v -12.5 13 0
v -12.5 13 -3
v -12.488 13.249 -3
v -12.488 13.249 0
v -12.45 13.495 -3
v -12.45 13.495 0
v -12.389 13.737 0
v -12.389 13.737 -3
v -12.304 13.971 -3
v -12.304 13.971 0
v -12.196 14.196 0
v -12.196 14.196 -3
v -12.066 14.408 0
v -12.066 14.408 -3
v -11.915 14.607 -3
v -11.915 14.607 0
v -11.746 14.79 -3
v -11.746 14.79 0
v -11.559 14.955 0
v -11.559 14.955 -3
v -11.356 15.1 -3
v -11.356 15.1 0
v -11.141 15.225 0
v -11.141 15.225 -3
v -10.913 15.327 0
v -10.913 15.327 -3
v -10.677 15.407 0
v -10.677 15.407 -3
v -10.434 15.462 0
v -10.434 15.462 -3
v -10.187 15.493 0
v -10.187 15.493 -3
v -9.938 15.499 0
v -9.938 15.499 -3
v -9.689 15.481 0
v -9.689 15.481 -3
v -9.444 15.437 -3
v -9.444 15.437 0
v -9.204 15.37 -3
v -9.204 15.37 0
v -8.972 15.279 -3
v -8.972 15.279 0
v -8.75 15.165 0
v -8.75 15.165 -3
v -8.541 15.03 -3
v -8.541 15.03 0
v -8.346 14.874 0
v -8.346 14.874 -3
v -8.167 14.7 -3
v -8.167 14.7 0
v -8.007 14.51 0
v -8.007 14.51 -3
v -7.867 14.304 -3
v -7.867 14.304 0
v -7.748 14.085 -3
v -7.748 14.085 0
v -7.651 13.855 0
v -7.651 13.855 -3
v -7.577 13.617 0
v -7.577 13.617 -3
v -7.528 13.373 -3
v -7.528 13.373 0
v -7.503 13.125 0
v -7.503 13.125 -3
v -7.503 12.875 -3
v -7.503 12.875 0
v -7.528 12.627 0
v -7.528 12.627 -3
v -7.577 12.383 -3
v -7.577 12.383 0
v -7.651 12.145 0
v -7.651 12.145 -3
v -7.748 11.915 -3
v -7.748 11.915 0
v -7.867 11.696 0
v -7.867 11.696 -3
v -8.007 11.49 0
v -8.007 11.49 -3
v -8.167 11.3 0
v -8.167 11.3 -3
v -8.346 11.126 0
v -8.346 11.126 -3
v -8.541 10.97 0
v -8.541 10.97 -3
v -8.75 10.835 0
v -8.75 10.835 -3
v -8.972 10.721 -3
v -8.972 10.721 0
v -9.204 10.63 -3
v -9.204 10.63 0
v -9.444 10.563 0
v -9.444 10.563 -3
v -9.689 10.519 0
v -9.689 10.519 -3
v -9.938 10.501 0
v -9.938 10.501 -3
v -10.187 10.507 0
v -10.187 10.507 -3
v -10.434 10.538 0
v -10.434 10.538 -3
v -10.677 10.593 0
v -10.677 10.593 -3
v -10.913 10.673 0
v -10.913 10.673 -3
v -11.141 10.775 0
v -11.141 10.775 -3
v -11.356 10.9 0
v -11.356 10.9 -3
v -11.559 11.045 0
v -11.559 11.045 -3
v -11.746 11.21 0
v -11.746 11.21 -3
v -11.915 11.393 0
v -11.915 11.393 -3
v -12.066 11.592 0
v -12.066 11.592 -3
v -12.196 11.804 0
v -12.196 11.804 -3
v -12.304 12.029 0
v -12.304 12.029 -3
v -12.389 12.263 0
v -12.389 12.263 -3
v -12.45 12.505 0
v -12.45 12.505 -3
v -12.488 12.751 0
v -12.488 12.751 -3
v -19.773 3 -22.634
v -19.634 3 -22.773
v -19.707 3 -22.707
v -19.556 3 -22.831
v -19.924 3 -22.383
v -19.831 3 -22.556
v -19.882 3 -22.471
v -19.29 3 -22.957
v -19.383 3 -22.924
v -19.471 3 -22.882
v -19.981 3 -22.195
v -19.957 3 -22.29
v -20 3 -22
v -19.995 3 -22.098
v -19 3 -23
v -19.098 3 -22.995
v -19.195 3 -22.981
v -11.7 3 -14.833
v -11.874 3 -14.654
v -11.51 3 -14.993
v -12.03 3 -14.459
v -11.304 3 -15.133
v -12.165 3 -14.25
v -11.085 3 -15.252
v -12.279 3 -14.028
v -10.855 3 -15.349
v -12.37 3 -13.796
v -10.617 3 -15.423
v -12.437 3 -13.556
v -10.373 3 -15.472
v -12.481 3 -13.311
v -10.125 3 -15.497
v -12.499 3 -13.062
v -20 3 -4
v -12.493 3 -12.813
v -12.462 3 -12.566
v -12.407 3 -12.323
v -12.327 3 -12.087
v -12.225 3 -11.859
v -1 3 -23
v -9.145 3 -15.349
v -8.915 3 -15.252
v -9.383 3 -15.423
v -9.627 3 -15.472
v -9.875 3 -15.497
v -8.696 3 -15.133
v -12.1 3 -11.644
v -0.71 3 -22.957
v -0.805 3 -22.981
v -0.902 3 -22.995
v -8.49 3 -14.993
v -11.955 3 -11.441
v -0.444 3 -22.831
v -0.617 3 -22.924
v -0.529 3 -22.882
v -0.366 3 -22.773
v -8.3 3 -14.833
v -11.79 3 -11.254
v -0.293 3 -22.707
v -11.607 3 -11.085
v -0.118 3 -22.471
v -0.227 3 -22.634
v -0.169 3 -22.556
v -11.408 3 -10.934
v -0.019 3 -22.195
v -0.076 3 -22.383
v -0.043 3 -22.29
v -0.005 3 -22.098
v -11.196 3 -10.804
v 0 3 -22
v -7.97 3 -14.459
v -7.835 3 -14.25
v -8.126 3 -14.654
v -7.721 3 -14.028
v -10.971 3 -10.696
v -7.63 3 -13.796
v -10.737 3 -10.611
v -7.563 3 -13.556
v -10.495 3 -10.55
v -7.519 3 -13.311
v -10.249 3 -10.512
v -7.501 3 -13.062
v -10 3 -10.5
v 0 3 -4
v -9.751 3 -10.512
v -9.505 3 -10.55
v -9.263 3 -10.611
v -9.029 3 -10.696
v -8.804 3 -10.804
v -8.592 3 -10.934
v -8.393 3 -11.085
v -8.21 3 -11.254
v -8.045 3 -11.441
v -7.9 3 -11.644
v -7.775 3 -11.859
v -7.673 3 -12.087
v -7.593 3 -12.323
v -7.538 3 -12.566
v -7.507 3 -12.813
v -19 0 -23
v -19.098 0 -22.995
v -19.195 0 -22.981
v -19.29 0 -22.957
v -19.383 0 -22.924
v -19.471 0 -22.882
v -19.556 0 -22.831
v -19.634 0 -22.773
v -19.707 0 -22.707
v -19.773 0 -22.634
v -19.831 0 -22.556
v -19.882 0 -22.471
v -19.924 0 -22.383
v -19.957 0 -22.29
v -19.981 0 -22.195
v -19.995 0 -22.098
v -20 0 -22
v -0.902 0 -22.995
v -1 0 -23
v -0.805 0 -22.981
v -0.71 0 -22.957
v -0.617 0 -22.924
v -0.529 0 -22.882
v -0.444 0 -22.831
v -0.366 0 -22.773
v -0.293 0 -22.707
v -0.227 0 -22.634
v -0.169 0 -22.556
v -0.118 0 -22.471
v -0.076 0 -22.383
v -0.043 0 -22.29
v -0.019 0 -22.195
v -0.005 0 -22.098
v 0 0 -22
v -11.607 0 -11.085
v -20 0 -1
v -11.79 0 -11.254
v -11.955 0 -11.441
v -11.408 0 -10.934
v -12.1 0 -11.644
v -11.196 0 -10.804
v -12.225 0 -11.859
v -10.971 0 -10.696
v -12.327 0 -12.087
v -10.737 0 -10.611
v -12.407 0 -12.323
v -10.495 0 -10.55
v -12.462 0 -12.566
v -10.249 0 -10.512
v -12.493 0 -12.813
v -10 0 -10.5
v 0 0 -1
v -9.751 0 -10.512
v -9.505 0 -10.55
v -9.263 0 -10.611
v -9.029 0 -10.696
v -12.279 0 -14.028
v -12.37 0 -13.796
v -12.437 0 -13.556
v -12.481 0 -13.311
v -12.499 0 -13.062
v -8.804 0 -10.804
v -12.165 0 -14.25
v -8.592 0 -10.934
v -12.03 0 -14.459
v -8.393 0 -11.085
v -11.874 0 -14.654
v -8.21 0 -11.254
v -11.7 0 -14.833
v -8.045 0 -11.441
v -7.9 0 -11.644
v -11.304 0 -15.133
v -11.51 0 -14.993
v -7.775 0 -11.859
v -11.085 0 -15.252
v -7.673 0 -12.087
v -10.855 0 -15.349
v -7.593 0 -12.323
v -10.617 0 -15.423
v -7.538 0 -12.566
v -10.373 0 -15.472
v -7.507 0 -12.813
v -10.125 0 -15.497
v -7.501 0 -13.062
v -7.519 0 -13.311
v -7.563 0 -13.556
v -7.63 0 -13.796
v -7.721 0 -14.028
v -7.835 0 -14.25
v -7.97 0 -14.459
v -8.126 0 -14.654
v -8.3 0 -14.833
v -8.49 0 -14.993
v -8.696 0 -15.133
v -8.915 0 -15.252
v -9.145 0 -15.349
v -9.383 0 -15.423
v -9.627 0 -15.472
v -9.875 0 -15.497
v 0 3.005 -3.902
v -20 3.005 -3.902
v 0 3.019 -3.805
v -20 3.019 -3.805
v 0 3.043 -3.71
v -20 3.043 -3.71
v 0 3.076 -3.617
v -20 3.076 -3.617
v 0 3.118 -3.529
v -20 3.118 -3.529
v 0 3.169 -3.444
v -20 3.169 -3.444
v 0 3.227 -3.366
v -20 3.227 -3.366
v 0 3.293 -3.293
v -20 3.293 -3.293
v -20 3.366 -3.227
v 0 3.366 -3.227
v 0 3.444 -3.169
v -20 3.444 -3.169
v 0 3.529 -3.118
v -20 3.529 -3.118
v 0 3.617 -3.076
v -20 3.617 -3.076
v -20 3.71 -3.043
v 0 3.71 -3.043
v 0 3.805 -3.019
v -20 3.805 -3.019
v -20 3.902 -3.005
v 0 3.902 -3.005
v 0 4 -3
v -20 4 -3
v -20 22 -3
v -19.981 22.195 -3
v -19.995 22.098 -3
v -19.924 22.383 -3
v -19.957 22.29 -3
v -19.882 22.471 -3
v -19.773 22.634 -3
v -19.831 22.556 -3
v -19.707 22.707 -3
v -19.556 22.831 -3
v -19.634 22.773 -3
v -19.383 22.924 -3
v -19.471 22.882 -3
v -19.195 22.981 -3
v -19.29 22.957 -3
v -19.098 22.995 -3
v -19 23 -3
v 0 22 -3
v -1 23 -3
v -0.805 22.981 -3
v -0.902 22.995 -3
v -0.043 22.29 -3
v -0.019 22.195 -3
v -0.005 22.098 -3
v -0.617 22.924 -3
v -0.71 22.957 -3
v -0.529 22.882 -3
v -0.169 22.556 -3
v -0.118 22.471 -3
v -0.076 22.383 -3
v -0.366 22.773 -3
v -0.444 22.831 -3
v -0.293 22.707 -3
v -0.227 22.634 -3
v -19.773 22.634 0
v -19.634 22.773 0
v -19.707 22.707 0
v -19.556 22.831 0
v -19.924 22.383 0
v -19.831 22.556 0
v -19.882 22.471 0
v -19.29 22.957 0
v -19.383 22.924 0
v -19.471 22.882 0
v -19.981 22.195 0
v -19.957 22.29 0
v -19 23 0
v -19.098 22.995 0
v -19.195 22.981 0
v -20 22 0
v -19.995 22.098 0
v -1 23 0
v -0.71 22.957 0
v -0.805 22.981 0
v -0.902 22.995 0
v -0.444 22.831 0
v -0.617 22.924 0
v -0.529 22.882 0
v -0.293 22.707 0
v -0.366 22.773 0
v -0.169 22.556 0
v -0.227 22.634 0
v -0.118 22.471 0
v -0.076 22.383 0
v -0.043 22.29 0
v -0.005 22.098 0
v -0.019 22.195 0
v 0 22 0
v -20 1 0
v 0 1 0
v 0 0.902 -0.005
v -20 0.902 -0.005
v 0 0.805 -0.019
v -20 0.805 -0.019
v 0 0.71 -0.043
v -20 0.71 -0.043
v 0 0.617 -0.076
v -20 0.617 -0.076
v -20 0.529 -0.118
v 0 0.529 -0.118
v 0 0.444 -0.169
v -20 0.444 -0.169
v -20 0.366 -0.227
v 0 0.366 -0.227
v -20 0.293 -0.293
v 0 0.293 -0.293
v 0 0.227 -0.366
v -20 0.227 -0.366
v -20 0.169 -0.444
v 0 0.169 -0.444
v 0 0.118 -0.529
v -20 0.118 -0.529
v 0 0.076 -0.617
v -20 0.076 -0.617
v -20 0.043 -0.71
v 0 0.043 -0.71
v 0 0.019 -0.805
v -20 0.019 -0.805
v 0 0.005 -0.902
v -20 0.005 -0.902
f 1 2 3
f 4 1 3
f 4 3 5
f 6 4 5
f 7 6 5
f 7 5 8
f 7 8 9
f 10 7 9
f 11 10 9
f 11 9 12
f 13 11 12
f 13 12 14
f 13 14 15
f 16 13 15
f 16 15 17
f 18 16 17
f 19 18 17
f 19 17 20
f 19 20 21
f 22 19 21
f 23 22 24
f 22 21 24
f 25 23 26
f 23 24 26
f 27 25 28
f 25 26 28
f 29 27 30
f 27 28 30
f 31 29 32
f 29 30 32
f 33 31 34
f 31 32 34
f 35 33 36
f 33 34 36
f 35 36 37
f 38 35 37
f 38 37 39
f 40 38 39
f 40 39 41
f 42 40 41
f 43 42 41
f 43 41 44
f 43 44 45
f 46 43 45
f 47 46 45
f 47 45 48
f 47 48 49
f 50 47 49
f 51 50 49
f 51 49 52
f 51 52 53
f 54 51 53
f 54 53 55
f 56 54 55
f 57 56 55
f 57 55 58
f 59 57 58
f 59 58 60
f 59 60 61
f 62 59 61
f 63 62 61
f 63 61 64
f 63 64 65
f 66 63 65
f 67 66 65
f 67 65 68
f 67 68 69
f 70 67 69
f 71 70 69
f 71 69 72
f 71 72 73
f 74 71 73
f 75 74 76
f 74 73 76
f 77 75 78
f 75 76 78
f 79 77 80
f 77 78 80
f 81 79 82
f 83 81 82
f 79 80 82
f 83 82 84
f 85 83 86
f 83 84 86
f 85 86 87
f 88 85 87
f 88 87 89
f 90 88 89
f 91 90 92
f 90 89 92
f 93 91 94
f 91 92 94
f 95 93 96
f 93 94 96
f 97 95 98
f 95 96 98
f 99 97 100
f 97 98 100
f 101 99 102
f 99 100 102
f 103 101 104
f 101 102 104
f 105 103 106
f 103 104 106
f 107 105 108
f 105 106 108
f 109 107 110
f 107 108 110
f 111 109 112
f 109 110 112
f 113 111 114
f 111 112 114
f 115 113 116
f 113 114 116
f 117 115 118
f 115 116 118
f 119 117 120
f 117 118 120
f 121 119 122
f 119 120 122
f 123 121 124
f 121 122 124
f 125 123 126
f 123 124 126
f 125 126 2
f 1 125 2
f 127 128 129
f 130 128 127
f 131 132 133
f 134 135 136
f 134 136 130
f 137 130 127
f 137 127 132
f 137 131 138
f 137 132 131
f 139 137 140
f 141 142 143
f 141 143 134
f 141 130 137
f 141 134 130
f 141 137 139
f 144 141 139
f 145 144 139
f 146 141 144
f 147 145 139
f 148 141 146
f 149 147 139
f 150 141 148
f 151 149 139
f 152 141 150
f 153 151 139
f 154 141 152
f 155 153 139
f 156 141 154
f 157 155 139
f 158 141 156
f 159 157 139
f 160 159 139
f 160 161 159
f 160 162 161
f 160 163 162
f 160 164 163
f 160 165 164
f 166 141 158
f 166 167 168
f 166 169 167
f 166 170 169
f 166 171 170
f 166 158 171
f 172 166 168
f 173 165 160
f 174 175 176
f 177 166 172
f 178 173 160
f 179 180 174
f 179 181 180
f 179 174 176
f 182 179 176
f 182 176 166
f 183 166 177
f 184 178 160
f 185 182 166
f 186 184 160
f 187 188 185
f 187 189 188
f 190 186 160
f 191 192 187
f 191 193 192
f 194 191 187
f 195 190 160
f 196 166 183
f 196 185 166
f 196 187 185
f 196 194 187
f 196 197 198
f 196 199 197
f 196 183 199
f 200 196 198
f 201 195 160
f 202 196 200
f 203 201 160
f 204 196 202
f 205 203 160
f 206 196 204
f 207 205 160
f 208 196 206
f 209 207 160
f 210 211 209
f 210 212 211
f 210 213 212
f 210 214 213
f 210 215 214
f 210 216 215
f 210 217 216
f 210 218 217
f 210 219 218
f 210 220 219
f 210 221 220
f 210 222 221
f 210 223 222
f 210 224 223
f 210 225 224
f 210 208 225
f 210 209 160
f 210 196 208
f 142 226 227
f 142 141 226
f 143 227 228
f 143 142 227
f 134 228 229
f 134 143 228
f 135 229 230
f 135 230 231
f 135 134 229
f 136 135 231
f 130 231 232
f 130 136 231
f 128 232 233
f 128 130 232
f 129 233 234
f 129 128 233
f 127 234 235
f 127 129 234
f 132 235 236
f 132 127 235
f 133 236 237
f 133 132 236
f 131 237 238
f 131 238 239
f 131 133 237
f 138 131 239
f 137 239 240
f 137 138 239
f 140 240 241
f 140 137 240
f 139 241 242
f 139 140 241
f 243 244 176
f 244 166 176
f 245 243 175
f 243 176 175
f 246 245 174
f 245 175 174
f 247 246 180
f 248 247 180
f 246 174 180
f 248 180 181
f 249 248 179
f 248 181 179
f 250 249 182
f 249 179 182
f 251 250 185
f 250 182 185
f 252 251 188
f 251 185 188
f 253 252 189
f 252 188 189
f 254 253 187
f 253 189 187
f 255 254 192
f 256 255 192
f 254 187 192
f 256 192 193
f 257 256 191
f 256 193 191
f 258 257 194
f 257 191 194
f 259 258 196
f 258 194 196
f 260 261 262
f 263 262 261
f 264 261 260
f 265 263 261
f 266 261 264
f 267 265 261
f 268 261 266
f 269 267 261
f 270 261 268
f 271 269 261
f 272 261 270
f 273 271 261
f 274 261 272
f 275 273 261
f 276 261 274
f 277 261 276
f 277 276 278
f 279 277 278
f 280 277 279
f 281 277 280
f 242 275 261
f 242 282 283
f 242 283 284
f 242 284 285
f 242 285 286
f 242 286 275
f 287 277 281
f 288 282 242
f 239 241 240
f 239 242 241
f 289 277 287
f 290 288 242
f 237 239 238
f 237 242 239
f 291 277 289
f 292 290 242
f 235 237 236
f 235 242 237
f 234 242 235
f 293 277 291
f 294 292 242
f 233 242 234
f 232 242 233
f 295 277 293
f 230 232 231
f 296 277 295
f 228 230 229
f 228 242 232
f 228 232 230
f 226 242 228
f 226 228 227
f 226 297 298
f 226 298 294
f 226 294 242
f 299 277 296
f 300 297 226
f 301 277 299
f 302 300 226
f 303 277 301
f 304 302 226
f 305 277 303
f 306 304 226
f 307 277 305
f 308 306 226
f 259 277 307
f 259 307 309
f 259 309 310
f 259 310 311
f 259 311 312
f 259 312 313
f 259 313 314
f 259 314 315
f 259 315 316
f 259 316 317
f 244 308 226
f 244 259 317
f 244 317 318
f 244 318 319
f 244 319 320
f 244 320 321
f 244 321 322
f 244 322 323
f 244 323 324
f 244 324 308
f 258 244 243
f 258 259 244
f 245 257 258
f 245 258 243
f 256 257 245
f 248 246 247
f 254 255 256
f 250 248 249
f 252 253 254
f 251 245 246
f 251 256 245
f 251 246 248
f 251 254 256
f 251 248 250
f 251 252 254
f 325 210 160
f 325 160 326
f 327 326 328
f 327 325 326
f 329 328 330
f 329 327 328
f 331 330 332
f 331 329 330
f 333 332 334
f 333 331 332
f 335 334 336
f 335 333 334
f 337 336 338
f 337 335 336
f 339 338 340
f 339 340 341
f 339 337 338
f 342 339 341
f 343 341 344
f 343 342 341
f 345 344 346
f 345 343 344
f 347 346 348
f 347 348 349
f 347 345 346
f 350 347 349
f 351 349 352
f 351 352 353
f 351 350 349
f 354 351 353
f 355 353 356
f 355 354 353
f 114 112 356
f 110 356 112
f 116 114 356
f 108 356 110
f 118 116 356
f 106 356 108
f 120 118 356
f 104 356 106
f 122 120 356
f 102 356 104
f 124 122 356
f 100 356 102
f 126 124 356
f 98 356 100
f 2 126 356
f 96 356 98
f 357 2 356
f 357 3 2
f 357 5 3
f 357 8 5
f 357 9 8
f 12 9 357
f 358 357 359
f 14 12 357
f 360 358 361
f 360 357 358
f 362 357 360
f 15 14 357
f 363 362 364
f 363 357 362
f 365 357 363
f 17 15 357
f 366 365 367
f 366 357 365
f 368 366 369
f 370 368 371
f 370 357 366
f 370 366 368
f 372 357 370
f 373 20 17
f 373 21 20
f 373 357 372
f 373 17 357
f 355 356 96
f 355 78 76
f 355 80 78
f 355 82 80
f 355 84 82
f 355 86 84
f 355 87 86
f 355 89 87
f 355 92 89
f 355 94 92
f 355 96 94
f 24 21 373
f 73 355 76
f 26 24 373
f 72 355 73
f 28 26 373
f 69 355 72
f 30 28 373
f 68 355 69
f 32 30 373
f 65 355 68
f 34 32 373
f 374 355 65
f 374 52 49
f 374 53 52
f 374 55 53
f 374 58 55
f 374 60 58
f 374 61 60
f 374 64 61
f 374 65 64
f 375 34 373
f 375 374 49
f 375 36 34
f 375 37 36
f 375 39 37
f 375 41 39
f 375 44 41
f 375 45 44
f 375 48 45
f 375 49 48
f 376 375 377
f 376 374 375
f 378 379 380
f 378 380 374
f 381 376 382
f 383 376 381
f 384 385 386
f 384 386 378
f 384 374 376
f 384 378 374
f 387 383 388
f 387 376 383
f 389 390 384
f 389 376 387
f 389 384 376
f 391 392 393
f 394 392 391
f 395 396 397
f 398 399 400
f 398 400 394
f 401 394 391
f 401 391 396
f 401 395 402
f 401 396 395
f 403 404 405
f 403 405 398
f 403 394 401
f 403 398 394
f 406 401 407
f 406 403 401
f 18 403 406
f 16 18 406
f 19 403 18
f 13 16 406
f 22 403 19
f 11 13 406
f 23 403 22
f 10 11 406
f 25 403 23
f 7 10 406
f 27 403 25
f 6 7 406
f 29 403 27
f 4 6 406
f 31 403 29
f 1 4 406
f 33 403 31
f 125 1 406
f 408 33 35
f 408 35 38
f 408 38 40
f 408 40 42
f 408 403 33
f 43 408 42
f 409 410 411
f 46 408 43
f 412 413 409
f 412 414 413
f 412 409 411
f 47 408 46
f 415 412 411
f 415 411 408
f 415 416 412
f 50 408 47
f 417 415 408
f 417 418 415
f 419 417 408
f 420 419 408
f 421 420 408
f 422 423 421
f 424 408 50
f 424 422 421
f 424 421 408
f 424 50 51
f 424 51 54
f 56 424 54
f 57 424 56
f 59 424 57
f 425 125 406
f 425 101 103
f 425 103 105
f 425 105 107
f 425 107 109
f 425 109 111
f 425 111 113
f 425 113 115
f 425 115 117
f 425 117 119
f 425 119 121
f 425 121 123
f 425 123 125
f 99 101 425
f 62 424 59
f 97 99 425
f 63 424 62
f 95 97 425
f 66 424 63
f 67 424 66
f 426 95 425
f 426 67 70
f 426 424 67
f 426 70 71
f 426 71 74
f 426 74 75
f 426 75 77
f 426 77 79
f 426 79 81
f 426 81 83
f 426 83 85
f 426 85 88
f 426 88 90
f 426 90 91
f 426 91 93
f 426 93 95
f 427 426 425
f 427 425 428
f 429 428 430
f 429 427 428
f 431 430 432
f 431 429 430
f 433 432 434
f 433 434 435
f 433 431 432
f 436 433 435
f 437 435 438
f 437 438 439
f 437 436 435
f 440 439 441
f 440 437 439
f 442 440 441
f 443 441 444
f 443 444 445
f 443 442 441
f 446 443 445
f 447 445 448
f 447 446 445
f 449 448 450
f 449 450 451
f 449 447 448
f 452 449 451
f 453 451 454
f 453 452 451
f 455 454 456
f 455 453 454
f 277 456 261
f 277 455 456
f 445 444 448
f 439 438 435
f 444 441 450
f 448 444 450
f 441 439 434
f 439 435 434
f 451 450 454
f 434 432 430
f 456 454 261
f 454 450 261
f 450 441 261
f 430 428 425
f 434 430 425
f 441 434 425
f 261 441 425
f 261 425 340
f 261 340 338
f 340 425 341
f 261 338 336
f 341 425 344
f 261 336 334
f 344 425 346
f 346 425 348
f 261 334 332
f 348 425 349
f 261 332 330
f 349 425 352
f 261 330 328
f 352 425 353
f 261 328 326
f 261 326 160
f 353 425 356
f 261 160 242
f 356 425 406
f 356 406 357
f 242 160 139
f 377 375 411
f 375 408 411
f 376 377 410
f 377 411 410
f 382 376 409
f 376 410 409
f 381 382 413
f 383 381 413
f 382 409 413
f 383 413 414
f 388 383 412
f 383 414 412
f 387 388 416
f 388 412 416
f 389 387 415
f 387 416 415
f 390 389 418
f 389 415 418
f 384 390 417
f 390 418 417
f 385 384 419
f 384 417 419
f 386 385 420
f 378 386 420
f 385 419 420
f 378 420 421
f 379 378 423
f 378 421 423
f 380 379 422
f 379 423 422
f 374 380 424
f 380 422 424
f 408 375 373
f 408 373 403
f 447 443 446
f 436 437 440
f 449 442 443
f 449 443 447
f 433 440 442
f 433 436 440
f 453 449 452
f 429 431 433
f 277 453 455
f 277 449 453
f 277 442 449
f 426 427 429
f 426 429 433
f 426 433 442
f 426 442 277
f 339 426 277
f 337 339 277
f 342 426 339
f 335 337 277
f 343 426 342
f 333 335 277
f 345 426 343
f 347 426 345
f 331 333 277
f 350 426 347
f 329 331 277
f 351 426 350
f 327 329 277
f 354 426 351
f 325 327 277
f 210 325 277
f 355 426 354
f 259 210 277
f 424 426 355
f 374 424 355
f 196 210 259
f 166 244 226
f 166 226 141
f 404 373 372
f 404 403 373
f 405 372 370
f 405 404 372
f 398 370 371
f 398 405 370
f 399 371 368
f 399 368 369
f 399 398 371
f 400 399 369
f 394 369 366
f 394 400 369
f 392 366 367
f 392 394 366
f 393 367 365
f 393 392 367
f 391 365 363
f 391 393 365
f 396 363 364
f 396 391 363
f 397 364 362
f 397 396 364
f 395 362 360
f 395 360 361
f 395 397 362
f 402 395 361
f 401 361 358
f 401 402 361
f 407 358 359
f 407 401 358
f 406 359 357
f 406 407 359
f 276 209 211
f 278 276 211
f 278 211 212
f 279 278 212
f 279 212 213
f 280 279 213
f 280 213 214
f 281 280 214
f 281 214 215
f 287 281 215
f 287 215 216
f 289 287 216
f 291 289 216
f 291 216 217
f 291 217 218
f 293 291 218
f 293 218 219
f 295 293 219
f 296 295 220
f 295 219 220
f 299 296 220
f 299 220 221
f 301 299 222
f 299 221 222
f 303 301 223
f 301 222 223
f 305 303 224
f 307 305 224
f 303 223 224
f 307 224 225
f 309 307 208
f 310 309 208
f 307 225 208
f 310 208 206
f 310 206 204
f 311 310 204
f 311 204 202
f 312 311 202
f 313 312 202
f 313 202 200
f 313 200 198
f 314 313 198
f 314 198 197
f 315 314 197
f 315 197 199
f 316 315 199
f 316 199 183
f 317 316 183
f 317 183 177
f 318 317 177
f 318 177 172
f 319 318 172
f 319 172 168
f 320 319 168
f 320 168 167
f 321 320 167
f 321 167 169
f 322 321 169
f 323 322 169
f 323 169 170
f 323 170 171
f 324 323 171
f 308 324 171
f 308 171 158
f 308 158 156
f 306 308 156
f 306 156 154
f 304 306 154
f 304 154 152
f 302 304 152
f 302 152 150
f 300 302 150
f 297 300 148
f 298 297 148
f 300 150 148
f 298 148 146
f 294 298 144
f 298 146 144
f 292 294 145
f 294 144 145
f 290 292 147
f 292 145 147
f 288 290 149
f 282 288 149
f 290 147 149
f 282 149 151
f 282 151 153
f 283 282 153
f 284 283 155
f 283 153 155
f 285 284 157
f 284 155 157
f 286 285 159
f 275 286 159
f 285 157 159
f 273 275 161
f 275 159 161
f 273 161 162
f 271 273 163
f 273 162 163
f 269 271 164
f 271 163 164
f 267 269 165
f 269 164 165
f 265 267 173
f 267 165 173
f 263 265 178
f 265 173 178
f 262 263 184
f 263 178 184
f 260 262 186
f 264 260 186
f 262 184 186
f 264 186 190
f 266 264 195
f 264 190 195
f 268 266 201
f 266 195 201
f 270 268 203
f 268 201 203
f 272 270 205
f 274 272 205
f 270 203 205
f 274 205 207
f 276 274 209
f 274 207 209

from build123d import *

# Parameters (mm, degrees)
BOSS_EXTRUDE1_DEPTH = 20
FILLET1_R           = 1
SKETCH3_R           = 2.5
CUT_EXTRUDE1_DEPTH  = 37.455452267
SKETCH4_R           = 2.5
CUT_EXTRUDE2_DEPTH  = 37.455452267


with BuildPart() as part:
    # Sketch2 → Boss-Extrude1 (new body)
    with BuildSketch(Plane(origin=(0, 0, 0), x_dir=(0, 0, -1), z_dir=(1, 0, 0))):
        with BuildLine():
            Line((1, 0), (23, 0))
            Line((23, 0), (23, 3))
            Line((23, 3), (4, 3))
            ThreePointArc((4, 3), (3.292893219, 3.292893219), (3, 4))
            Line((3, 4), (3, 23))
            Line((3, 23), (0, 23))
            Line((0, 23), (0, 1))
            ThreePointArc((0, 1), (0.292893219, 0.292893219), (1, 0))
        make_face()
    extrude(amount=-BOSS_EXTRUDE1_DEPTH)

    # Fillet1
    fillet1_edges = [part.edges().sort_by_distance(p)[0] for p in [
        (0, 1.5, -23),
        (-20, 23, -1.5),
        (-20, 1.5, -23),
        (0, 23, -1.5),
    ]]
    fillet(fillet1_edges, radius=FILLET1_R)

    # Sketch3 → Cut-Extrude1 (cut, through all)
    with BuildSketch(Plane(origin=(0, 0, -3), x_dir=(-1, 0, 0), z_dir=(0, 0, -1))):
        with Locations((10, 13)):
            Circle(SKETCH3_R)
    extrude(amount=-CUT_EXTRUDE1_DEPTH, mode=Mode.SUBTRACT)

    # Sketch4 → Cut-Extrude2 (cut, through all)
    with BuildSketch(Plane(origin=(0, 3, 0), x_dir=(1, 0, 0), z_dir=(0, 1, 0))):
        with Locations(Location((-10, 13, 0), (0, 0, 270))):
            Circle(SKETCH4_R)
    extrude(amount=-CUT_EXTRUDE2_DEPTH, mode=Mode.SUBTRACT)


solid = part.part
